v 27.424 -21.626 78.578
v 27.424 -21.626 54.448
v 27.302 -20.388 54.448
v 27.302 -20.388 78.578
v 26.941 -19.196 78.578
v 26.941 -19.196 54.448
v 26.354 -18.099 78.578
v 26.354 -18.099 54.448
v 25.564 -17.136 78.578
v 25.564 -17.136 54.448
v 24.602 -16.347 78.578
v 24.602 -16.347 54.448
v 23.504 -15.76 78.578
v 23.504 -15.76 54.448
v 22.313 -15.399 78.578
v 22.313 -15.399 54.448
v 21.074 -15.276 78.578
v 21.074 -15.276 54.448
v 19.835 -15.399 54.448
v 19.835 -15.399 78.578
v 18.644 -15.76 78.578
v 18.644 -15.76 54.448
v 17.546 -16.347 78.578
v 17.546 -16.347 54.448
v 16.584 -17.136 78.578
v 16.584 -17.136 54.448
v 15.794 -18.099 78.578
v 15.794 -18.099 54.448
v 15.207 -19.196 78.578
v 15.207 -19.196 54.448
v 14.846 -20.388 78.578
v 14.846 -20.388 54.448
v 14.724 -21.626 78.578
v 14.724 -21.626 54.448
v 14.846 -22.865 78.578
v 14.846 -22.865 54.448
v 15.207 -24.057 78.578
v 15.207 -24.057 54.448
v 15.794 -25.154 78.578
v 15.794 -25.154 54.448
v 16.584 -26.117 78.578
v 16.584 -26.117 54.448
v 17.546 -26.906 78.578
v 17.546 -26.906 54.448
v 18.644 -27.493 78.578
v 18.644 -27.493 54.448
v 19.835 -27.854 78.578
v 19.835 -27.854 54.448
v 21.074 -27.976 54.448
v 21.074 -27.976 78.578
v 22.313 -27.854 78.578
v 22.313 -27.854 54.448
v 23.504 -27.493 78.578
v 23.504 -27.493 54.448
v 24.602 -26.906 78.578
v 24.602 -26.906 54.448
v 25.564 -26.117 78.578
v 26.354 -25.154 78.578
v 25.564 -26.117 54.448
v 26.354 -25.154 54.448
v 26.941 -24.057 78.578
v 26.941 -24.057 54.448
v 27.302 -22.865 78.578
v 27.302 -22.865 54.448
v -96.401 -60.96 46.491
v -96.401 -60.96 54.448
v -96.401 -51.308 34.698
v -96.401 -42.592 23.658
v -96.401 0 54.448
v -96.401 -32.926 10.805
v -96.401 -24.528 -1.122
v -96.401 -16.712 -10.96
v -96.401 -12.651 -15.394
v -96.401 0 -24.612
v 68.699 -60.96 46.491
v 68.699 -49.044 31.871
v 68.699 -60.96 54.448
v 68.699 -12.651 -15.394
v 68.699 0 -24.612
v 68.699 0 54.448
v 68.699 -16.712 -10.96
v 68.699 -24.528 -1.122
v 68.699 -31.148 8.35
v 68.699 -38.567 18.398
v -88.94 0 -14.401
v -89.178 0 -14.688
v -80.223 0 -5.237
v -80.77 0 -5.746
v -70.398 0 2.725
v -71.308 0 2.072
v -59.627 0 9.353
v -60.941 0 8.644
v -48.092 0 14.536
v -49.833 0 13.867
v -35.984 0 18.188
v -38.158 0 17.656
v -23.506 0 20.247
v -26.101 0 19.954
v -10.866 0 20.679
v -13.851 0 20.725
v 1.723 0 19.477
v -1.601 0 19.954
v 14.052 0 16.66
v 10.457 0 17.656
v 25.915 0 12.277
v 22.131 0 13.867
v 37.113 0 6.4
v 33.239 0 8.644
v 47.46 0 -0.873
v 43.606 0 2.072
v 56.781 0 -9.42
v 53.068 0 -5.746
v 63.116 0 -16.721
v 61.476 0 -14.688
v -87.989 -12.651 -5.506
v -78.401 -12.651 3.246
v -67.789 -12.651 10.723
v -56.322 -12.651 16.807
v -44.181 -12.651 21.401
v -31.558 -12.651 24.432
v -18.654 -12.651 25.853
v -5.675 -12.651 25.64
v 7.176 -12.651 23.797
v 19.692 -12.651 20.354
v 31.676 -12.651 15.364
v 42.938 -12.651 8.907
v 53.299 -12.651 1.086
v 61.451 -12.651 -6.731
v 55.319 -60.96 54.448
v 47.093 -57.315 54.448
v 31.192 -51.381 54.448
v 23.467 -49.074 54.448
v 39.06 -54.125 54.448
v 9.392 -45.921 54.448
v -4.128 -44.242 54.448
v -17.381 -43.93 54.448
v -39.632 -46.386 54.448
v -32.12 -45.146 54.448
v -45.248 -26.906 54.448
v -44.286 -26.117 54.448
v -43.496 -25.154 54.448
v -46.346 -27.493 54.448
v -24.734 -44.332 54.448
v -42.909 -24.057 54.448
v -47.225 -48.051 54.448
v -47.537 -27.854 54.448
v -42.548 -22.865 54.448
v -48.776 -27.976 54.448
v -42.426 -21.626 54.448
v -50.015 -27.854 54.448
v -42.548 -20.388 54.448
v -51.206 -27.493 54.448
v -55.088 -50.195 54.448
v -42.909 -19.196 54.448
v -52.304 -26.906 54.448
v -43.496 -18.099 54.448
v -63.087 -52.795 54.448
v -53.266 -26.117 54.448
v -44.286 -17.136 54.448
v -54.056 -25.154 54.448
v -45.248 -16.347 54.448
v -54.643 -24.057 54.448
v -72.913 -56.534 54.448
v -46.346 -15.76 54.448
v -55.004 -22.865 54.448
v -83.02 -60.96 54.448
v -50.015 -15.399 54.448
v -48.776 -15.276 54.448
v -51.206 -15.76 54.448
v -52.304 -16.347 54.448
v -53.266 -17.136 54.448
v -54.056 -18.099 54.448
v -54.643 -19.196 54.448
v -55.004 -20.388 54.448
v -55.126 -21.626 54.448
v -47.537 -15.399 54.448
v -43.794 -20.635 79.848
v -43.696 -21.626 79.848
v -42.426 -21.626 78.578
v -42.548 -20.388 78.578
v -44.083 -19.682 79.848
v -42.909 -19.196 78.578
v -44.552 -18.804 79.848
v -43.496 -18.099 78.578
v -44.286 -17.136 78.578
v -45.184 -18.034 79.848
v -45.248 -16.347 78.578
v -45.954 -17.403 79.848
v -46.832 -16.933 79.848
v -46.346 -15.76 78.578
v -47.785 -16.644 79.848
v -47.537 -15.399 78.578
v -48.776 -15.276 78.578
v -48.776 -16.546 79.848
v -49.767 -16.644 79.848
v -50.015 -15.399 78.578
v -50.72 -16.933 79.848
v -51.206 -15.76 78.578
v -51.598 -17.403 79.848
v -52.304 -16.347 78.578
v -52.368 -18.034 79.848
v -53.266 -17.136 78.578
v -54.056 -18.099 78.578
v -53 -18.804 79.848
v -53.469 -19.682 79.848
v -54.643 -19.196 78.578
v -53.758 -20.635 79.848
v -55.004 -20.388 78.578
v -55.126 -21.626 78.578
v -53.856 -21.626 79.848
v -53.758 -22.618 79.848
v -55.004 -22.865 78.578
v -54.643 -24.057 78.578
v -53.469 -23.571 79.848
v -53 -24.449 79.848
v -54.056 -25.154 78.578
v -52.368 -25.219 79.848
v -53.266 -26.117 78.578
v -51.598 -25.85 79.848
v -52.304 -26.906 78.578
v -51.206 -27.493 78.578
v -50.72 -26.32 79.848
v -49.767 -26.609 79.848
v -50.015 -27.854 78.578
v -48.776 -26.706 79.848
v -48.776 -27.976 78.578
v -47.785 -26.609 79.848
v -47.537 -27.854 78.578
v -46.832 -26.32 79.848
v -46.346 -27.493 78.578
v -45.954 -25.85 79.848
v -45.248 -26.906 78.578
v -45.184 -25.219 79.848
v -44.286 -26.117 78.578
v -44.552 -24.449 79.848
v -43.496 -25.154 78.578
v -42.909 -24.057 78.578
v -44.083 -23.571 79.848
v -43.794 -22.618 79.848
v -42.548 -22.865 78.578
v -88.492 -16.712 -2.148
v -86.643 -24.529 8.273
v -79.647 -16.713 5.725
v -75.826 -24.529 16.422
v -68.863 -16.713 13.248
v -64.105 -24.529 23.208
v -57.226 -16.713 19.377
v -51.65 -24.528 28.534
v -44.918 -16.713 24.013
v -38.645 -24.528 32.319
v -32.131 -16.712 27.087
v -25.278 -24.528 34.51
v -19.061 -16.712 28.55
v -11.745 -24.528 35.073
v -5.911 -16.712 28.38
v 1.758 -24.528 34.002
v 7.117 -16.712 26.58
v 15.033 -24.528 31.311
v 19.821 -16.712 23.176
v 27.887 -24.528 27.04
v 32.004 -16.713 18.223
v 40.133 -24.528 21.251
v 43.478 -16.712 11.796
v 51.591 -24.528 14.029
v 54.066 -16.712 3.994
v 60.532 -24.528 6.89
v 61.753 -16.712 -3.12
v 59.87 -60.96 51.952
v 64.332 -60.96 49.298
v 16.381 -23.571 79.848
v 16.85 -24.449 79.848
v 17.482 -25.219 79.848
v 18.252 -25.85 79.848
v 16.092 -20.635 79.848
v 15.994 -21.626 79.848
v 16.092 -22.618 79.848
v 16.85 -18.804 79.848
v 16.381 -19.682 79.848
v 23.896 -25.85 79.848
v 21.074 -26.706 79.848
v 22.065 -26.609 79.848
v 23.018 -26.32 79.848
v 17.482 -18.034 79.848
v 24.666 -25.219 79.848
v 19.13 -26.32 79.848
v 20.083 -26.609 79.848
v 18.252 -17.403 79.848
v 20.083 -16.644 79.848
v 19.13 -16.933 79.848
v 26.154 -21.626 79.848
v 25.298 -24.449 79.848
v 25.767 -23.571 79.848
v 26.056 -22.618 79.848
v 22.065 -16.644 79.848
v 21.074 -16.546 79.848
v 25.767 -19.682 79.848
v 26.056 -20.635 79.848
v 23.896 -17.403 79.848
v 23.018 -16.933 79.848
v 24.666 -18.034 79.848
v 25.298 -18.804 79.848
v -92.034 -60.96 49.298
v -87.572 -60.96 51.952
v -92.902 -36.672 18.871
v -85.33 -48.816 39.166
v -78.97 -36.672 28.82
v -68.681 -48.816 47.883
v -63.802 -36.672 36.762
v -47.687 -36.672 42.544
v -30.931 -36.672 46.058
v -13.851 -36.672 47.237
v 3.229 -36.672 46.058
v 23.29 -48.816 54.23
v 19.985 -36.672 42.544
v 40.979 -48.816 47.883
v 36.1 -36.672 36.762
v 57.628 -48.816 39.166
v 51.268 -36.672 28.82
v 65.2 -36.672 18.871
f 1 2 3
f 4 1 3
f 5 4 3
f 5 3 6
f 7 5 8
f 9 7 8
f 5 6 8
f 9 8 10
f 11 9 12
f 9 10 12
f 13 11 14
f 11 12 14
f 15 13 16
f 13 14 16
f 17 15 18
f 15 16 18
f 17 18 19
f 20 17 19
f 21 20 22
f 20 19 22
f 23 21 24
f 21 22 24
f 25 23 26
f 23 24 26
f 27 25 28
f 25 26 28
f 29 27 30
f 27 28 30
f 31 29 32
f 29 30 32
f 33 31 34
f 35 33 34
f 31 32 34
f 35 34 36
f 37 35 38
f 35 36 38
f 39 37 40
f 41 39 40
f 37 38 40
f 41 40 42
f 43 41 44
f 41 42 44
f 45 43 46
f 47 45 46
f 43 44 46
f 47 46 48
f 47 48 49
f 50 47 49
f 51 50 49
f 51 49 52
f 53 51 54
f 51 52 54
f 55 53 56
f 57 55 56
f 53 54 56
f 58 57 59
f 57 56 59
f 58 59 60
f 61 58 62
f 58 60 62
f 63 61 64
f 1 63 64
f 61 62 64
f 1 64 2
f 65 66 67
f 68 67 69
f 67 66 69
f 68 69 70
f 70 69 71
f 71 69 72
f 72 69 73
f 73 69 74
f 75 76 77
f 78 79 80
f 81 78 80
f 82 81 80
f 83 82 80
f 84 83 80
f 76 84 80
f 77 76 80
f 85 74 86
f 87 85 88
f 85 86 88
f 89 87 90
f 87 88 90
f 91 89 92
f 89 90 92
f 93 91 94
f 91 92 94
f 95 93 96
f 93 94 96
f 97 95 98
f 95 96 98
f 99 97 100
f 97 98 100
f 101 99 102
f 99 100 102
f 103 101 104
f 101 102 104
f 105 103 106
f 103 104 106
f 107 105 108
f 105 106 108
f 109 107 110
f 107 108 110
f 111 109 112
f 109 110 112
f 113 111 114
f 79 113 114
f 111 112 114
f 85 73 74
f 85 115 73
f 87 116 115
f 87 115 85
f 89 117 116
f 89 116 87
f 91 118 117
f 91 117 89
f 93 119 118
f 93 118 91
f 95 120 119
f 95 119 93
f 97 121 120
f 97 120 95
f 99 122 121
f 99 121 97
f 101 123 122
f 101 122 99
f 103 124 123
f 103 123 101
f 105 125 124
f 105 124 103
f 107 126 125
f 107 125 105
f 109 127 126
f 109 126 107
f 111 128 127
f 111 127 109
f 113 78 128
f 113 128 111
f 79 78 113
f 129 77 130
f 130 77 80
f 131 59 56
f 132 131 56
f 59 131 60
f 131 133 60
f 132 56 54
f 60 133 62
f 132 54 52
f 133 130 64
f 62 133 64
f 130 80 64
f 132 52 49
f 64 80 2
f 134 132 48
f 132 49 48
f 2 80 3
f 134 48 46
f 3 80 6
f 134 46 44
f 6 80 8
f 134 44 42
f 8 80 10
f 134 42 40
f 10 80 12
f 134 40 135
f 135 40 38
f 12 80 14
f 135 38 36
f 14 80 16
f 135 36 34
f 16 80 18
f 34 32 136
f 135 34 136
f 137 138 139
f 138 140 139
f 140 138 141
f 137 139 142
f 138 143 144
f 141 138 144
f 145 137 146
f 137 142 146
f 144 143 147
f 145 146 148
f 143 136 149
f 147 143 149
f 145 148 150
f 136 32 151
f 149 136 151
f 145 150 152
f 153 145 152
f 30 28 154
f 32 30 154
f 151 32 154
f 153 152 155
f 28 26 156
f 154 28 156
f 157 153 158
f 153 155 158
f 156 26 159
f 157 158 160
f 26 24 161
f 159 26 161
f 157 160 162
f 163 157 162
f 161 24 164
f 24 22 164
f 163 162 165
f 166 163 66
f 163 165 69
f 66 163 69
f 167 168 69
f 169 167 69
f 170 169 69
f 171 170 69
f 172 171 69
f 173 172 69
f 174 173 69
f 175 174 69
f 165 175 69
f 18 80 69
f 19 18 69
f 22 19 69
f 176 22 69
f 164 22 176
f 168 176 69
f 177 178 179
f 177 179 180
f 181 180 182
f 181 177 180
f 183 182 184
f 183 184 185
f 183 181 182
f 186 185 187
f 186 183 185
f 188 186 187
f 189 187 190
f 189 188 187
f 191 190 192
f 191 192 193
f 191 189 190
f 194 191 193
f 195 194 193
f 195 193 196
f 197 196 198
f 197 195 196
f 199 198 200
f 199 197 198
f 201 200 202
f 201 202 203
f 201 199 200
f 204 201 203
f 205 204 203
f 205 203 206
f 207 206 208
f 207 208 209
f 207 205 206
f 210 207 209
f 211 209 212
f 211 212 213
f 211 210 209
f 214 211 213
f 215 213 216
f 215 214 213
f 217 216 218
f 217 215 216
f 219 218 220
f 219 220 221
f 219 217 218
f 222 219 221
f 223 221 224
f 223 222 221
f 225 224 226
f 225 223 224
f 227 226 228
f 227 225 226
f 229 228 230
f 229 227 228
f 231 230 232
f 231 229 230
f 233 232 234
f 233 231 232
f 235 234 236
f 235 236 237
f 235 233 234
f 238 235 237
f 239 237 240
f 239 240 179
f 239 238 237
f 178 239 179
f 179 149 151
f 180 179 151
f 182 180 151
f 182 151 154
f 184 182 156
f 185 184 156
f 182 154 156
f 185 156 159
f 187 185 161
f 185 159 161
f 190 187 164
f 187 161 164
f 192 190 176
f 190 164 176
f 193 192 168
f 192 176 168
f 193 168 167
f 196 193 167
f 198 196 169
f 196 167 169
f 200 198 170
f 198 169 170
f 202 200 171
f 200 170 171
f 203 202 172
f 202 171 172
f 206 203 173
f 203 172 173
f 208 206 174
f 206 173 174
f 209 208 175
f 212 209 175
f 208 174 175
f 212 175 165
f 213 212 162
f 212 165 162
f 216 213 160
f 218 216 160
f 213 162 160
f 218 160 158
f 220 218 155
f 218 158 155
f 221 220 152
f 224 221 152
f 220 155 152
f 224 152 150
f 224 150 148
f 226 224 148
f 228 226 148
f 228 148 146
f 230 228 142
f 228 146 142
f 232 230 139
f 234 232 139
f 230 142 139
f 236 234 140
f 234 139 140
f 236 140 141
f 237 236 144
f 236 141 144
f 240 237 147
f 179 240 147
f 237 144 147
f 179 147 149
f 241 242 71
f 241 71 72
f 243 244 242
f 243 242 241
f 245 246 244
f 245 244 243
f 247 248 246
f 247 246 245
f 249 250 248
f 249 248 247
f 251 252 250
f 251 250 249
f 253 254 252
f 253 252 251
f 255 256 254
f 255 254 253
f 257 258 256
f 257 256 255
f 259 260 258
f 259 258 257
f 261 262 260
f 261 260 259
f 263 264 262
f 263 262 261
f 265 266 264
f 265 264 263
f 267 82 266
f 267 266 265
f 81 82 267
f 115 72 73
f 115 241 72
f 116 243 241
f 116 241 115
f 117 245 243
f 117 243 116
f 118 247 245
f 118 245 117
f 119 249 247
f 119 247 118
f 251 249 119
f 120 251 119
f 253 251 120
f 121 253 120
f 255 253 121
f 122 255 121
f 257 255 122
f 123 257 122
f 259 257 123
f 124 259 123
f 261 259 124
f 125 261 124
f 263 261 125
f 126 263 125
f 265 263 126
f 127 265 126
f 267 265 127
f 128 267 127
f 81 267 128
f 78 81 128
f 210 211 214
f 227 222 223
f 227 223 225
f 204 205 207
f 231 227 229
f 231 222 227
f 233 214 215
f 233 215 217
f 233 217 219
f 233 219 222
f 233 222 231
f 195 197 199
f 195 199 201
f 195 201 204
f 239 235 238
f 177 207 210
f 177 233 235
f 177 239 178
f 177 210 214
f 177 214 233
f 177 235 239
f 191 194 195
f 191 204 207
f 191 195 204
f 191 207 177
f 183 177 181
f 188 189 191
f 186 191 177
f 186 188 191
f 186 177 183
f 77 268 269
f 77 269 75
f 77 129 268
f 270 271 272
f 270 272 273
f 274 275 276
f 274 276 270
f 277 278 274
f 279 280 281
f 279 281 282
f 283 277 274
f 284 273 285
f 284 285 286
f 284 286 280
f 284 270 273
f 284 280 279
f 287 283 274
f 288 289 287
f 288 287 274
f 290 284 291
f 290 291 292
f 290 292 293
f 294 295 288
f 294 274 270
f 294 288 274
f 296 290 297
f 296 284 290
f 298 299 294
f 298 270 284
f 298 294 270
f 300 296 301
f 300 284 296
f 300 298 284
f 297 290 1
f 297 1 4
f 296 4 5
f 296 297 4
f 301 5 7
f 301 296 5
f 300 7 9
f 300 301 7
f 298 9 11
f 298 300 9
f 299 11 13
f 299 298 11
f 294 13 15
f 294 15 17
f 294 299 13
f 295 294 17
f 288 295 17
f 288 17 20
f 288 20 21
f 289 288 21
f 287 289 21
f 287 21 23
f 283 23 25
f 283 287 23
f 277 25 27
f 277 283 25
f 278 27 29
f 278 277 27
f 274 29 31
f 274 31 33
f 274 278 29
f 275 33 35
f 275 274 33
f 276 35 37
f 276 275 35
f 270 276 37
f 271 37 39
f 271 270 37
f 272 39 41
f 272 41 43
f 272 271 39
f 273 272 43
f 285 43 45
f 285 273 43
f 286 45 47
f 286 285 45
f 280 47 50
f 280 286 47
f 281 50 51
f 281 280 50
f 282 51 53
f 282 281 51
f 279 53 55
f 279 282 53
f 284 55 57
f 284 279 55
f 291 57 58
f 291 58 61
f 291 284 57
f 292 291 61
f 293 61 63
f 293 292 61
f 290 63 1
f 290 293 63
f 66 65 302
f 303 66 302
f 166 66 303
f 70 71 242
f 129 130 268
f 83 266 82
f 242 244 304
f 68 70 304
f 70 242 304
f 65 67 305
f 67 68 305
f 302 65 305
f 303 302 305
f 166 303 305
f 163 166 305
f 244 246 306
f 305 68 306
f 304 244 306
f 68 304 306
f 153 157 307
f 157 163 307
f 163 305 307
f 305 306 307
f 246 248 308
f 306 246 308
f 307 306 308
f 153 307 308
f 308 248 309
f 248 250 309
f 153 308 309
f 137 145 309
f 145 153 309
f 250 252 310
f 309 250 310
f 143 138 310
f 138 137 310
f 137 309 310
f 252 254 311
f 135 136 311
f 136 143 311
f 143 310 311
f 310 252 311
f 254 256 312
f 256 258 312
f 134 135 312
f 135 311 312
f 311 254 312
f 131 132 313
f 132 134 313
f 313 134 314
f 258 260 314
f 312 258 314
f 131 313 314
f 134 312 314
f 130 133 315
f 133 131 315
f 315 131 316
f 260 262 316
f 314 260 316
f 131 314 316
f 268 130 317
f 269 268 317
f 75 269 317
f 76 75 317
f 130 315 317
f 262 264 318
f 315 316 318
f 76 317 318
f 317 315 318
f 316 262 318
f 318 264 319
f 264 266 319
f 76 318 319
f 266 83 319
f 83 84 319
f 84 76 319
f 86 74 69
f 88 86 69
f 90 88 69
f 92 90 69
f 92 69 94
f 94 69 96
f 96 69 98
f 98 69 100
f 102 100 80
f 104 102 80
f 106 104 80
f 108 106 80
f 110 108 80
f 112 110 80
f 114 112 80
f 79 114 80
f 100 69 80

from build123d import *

# Parameters (mm, degrees)
F1_DEPTH    = 60.96
F2_T2_ANGLE = 359.64
F3_SIZE     = 10.15999
F4_R        = 6.35
F5_DEPTH    = 25.4
F6_SIZE     = 1.27
F7_SIZE     = 5.08
F8_SIZE     = 5.08


# Not quite as in the source:
# - a fillet or chamfer that OpenCascade refuses, or shapes differently, is made with other operations: its cross-section is extruded or revolved along the edge and cut away or added
# - a fillet or chamfer is up to 0.001 mm smaller than in the source, because OpenCascade refuses the exact size


with BuildPart() as f1:
    # F0 (on Front) → F1 (new body)
    with BuildSketch(Plane.XZ):
        with BuildLine():
            Line((68.6990445861, 54.4476021031), (0, 54.4476021031))
            Line((0, 54.4476021031), (-96.4009554139, 54.4476021031))
            Line((-96.4009554139, 54.4476021031), (-96.4009554139, -24.6122339721))
            ThreePointArc((-96.4009554139, -24.6122339721), (-13.8509554139, 20.7245603096), (68.6990445861, -24.6122339721))
            Line((68.6990445861, -24.6122339721), (68.6990445861, 54.4476021031))
        make_face()
    extrude(amount=F1_DEPTH)

    # F2: chamfer of 50.8 on 1 edges, made by hand

    # F2_s1 → F2_t2 (revolve, cut)
    with BuildSketch(Plane(origin=(-13.6086096269, 0, 0.0427528487), x_dir=(0, 1, 0), z_dir=(0.9999950652, 0, -0.0031415875))):
        Polygon((-60.96, -225.7638003707), (-10.16, -174.9638003707), (-60.96, -174.9638003707), align=None)
    revolve(axis=Axis((-13.8509554139, -60.96, -77.0980532681), (0, 1, 0)), revolution_arc=F2_T2_ANGLE, mode=Mode.SUBTRACT)

    # F3 (size 10.16 in the source; OpenCascade refuses exactly that, so slightly less here)
    f3_edges = [f1.edges().sort_by_distance(p)[0] for p in [
        (-13.850955, -10.16, 20.72456),
    ]]
    chamfer(f3_edges, length=F3_SIZE)

    # F4 (on face) → F5 (join)
    with BuildSketch(Plane.XY.offset(54.4476021031)):
        with Locations((-48.7759554139, -21.6264873743)):
            Circle(F4_R)
        with Locations((21.0740445861, -21.6264873743)):
            Circle(F4_R)
    extrude(amount=F5_DEPTH)

    # F6
    f6_edges = [f1.edges().sort_by_distance(p)[0] for p in [
        (-55.125955, -21.626487, 79.847602),
        (14.724045, -21.626487, 79.847602),
    ]]
    chamfer(f6_edges, length=F6_SIZE)

    # F7
    f7_edges = [f1.edges().sort_by_distance(p)[0] for p in [
        (-13.850955, -17.344239, 27.9088),
    ]]
    chamfer(f7_edges, length=F7_SIZE)

    # F8
    f8_edges = [f1.edges().sort_by_distance(p)[0] for p in [
        (-13.850955, -20.936342, 31.500902),
    ]]
    chamfer(f8_edges, length=F8_SIZE)


solid = f1.part
